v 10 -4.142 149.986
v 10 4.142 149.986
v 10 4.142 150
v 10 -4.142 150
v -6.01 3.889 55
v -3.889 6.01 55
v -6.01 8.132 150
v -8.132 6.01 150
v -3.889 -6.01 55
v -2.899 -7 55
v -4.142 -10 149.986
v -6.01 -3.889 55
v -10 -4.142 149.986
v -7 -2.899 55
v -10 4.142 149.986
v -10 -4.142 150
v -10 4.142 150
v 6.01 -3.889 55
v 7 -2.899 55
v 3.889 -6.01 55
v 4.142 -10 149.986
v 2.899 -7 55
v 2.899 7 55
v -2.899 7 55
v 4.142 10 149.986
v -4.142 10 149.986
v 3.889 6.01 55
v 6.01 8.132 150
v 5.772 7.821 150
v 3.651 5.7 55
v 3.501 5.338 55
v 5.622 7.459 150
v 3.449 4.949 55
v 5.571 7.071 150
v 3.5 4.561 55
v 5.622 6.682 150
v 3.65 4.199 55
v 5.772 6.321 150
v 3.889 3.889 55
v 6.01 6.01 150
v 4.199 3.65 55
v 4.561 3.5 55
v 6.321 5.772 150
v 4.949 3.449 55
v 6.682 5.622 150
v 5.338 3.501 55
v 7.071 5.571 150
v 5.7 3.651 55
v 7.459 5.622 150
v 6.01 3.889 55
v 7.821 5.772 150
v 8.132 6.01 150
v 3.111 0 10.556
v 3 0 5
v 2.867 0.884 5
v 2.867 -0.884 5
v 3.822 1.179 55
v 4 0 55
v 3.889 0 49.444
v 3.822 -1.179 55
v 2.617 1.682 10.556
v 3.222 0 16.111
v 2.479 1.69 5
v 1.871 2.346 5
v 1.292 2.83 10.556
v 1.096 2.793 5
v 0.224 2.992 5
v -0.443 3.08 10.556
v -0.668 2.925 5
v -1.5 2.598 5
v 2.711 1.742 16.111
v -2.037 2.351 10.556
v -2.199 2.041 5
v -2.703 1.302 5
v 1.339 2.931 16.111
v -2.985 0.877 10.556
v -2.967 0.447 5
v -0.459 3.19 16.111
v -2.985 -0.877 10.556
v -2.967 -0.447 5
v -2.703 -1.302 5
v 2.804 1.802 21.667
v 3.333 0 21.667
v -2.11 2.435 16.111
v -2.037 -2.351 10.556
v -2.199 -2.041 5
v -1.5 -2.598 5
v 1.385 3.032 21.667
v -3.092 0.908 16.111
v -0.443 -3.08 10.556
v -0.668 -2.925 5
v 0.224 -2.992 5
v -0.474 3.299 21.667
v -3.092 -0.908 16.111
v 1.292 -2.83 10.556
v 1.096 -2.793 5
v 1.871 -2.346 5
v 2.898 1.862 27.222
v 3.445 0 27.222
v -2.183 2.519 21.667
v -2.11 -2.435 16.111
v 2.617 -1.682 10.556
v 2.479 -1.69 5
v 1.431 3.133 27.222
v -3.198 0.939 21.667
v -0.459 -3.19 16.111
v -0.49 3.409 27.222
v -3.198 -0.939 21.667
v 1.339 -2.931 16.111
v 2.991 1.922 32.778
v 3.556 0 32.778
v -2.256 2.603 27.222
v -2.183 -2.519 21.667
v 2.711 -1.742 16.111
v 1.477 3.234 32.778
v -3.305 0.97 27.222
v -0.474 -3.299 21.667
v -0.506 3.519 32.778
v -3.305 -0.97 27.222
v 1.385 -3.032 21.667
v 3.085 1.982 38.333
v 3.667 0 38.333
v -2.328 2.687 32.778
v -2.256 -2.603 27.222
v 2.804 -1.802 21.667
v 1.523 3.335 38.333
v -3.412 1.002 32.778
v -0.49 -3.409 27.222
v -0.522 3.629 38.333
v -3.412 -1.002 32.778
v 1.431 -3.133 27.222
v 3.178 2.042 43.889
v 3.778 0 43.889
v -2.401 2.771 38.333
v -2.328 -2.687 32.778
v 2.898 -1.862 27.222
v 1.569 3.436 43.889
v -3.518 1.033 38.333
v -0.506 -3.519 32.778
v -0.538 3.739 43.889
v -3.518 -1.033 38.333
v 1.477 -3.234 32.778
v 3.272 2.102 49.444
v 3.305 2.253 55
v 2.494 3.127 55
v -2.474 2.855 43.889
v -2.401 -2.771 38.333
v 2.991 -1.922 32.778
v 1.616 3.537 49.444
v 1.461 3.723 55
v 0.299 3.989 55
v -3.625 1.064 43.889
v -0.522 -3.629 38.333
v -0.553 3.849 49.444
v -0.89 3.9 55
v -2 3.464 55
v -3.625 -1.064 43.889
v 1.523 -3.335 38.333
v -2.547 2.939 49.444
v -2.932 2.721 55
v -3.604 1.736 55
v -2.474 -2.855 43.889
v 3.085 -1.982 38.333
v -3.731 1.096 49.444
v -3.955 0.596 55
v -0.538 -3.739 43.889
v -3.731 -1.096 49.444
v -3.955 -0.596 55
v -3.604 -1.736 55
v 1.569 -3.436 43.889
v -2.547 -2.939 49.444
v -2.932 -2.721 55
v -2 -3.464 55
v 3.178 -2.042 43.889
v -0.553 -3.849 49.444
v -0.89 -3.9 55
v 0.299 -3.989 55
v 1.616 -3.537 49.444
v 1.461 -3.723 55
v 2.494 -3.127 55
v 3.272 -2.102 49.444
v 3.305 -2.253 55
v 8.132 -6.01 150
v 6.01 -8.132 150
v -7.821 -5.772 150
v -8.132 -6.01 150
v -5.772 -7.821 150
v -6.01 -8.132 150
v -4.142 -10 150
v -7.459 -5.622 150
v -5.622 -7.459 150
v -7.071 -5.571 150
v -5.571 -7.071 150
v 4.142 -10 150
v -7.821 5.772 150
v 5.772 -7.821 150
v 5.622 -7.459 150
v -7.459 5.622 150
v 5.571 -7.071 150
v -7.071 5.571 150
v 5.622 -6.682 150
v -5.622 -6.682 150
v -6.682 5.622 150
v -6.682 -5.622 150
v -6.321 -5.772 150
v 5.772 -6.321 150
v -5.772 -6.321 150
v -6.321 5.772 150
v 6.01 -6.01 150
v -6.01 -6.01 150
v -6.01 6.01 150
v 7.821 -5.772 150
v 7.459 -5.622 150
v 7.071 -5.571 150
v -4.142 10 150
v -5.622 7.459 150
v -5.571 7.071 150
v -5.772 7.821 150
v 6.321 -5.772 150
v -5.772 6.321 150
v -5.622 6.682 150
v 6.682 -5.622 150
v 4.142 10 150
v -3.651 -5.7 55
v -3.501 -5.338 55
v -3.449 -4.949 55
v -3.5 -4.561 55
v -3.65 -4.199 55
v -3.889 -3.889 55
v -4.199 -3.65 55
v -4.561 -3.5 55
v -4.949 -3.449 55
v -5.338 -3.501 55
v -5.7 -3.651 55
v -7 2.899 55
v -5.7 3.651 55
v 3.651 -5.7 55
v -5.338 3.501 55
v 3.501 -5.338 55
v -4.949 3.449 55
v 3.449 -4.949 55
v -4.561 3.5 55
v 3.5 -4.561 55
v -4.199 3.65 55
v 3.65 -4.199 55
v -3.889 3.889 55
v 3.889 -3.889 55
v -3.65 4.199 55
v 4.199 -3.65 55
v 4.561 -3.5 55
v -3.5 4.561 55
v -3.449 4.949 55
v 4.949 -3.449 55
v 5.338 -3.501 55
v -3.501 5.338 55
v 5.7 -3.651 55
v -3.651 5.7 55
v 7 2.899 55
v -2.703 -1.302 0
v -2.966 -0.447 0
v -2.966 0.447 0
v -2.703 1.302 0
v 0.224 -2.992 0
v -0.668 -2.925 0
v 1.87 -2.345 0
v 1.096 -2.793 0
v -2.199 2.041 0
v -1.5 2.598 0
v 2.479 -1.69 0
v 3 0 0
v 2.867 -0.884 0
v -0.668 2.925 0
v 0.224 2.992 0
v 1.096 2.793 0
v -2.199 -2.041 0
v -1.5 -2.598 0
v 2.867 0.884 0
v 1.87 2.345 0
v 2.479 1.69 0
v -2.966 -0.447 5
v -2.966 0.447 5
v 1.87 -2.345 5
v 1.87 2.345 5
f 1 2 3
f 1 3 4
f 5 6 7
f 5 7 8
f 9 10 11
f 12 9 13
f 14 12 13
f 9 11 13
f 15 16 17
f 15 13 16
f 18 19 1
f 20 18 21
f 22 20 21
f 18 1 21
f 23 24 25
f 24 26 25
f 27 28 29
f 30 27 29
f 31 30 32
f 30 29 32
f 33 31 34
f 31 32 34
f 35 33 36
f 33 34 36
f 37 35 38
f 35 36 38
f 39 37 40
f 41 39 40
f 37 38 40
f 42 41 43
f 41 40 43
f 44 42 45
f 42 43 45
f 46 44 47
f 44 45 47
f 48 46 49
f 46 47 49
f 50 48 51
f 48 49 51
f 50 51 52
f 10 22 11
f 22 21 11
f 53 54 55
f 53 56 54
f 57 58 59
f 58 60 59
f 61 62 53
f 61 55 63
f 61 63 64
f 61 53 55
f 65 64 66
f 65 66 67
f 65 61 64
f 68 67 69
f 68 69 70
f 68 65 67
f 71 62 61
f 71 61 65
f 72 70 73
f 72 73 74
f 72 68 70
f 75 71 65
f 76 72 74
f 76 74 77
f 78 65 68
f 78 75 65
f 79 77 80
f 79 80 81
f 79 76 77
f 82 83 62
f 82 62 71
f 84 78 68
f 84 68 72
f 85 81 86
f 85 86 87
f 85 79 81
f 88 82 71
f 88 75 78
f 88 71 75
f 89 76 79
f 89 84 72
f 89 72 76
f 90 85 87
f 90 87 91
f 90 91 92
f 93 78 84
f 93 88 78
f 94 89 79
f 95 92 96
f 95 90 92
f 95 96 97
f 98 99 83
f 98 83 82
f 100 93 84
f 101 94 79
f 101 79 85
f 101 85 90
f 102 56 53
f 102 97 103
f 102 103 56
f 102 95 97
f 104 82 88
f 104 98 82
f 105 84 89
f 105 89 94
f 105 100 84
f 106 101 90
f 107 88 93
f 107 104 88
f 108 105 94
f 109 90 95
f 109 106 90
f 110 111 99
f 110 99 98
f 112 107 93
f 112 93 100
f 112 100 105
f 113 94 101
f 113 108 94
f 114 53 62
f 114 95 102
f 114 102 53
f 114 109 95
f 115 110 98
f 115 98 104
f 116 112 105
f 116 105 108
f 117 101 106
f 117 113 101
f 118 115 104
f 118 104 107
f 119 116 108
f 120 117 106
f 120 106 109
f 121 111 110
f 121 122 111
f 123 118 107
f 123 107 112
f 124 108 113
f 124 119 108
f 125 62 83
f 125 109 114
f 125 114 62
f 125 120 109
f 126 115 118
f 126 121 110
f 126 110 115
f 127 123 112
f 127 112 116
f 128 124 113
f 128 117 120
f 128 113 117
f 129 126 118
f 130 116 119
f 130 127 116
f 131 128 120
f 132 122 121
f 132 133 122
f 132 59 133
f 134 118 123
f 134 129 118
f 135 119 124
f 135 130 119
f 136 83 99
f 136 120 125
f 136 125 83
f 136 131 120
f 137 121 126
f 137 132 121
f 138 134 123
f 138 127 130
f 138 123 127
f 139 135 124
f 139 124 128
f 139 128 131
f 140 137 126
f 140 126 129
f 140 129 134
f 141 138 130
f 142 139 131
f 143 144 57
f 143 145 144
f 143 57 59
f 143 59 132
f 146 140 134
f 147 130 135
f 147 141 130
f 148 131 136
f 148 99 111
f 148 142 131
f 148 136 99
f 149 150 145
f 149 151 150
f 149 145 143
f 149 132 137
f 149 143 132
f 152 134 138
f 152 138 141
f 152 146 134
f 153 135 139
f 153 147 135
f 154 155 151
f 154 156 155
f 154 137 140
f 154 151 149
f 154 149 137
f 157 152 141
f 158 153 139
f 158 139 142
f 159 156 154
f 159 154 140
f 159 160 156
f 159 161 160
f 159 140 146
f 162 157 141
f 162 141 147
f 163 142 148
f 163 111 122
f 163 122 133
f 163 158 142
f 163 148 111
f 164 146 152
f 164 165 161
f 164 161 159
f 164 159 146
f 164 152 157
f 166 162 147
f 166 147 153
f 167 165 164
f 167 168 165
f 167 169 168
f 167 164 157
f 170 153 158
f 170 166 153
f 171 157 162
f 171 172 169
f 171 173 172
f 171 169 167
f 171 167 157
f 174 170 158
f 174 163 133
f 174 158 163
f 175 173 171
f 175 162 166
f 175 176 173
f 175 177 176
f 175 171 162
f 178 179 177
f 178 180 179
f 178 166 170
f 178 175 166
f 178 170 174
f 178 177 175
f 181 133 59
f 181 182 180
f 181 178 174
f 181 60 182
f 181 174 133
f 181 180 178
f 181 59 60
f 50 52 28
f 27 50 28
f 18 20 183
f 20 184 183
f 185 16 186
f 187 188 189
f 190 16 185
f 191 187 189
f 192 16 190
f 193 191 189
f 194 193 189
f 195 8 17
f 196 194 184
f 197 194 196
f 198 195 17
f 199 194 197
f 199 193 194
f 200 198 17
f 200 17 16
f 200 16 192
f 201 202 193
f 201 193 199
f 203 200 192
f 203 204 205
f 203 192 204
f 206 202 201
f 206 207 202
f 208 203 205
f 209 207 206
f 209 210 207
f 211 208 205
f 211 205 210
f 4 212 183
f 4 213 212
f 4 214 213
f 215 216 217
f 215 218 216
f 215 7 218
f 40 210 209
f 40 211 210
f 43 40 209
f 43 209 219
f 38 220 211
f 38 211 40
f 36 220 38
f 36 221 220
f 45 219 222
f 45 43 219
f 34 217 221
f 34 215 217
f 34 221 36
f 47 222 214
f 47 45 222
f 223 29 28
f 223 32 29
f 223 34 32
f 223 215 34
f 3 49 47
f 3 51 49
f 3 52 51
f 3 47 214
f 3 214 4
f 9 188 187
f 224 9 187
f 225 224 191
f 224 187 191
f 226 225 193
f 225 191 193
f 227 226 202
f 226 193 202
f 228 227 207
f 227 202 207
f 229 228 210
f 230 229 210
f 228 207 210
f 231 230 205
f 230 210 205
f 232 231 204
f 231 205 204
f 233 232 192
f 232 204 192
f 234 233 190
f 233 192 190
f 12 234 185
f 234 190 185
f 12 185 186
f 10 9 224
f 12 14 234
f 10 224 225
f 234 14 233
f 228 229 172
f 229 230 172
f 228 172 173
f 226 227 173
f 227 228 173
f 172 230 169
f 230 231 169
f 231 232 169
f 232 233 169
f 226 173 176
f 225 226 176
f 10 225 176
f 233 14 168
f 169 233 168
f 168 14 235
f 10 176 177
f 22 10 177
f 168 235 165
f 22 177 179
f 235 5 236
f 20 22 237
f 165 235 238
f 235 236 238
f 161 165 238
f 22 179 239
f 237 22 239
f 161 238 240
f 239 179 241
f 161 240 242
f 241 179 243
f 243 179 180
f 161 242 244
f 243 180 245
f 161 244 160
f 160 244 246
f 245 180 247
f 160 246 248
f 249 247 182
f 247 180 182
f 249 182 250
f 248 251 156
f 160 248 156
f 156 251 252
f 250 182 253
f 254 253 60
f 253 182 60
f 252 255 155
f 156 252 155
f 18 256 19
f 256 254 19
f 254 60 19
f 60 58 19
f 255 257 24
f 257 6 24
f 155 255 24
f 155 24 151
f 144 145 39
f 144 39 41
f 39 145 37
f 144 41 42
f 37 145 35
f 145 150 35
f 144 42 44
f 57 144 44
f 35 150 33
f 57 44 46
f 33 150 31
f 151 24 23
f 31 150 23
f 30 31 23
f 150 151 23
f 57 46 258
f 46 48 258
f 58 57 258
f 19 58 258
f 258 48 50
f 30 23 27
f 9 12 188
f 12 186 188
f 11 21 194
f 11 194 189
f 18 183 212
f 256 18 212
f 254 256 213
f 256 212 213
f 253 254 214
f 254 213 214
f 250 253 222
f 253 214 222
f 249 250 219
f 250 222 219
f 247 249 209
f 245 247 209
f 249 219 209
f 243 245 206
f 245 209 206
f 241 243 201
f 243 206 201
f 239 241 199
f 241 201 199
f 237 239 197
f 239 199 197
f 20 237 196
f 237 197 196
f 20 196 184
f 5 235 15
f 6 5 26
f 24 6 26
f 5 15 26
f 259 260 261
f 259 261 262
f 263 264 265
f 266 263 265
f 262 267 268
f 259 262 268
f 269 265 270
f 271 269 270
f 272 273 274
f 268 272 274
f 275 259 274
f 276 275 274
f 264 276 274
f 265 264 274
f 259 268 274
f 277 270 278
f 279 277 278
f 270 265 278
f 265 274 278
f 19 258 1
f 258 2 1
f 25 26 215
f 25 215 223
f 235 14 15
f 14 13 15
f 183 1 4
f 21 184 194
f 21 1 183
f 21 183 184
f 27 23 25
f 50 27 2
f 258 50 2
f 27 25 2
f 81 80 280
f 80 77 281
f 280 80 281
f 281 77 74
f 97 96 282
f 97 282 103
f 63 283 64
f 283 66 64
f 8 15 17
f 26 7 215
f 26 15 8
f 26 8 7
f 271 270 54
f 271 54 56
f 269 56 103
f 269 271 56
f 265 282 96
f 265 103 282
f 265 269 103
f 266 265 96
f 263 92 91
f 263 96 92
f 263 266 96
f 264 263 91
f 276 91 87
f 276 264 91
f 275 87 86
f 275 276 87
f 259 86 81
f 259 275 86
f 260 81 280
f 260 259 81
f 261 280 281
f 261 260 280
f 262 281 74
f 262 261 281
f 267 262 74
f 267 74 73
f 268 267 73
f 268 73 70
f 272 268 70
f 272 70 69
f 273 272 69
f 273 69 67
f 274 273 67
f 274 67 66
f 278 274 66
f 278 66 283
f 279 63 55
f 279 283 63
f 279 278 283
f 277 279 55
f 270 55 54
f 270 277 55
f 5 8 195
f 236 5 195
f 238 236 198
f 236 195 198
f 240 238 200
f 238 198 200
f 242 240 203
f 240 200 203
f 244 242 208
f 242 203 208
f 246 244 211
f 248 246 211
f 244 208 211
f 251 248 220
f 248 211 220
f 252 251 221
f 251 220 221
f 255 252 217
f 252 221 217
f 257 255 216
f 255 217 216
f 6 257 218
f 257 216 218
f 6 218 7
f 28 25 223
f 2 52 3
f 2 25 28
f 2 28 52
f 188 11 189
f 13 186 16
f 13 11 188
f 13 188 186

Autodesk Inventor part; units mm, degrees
sketch "Эскиз1" plane through (0, 0, 0) normal (0, 0, 1) x (1, 0, 0)
  circle A0 centre (0, 0) radius 3
  dimension "d0" = 6
extrude "Выдавливание1" add sketch "Эскиз1" along normal blind 5
sketch "Эскиз2" plane through (0, 0, 5) normal (0, 0, 1) x (1, 0, 0)
  circle A0 centre (0, 0) radius 4
  dimension "d3" = 8
extrude "Выдавливание2" add sketch "Эскиз2" along normal blind 50
sketch "Эскиз3" plane through (0, 0, 55) normal (0, 0, 1) x (1, 0, 0)
  line L0 (-10, 4.1421) -> (-4.1421, 10)
  line L1 (-4.1421, 10) -> (4.1421, 10)
  line L2 (4.1421, 10) -> (10, 4.1421)
  line L3 (10, 4.1421) -> (10, -4.1421)
  line L4 (10, -4.1421) -> (4.1421, -10)
  line L5 (4.1421, -10) -> (-4.1421, -10)
  line L6 (-4.1421, -10) -> (-10, -4.1421)
  line L7 (-10, -4.1421) -> (-10, 4.1421)
  point P0 (0, 0)
  point P1 (0, 0)
  dimension "d6" = 20
extrude "Выдавливание3" add sketch "Эскиз3" along normal blind 95
chamfer "Фаска1" distance 1 distance2 50 1 edges at (-4, 0, 5) measured on face at (3.6279, -0.3191, 5)
chamfer "Фаска2" distance 3 angle 88.191 8 edges at (7.0711, 7.0711, 55) (0, 10, 55) (-7.0711, 7.0711, 55) (-10, 0, 55) (-7.0711, -7.0711, 55) (0, -10, 55) (7.0711, -7.0711, 55) (10, 0, 55) measured on face at (-0.1607, 7.9903, 55)
ref_plane "РабПлоскость1" through (-7.0711, 7.0711, 150) normal (-0.0223186, 0.0223186, 0.9995018) x (-0.7071068, -0.7071068, 0)
sketch "Эскиз4" plane through (-7.0711, 7.0711, 150) normal (-0.0223186, 0.0223186, 0.9995018) x (-0.7071068, -0.7071068, 0)
  line L0 (-4.1421, 0) -> (4.1421, 0) projected
  arc A0 (1.5, 0) -> (-1.5, 0) centre (0, 0) ccw
  point P0 (0, 5.2605)
  dimension "d15" = 1.5
extrude "Выдавливание4" cut sketch "Эскиз4" against normal up to next
ref_plane "РабПлоскость2" through (7.0711, 7.0711, 150) normal (0.0223186, 0.0223186, 0.9995018) x (-0.7071068, 0.7071068, 0)
sketch "Эскиз5" plane through (7.0711, 7.0711, 150) normal (0.0223186, 0.0223186, 0.9995018) x (-0.7071068, 0.7071068, 0)
  line L0 (-4.1421, 0) -> (4.1421, 0) projected
  line L1 (-2.8995, 0) -> (2.8995, 0) projected
  arc A0 (1.5, 0) -> (-1.5, 0) centre (0, 0) ccw
  line L2 (1.5, 0) -> (-1.5, 0)
  point P0 (0, 5.2605)
  dimension "d18" = 1.5
extrude "Выдавливание5" cut sketch "Эскиз5" against normal up to next
ref_plane "РабПлоскость3" through (7.0711, -7.0711, 150) normal (0.0223186, -0.0223186, 0.9995018) x (0.7071068, 0.7071068, 0)
ref_plane "РабПлоскость4" through (-7.0711, -7.0711, 150) normal (-0.0223186, -0.0223186, 0.9995018) x (0.7071068, -0.7071068, 0)
sketch "Эскиз6" plane through (7.0711, -7.0711, 150) normal (0.0223186, -0.0223186, 0.9995018) x (0.7071068, 0.7071068, 0)
  line L0 (-4.1421, 0) -> (4.1421, 0) projected
  arc A0 (1.5, 0) -> (-1.5, 0) centre (0, 0) ccw
  line L1 (1.5, 0) -> (-1.5, 0)
  point P0 (0, 5.2605)
  dimension "d21" = 1.5
extrude "Выдавливание6" cut sketch "Эскиз6" against normal up to next
sketch "Эскиз7" plane through (-7.0711, -7.0711, 150) normal (-0.0223186, -0.0223186, 0.9995018) x (0.7071068, -0.7071068, 0)
  line L0 (-4.1421, 0) -> (4.1421, 0) projected
  arc A0 (1.5, 0) -> (-1.5, 0) centre (0, 0) ccw
  line L1 (-1.5, 0) -> (1.5, 0)
  point P0 (0, 5.2605)
  dimension "d24" = 1.5
extrude "Выдавливание7" cut sketch "Эскиз7" against normal up to next
properties part number "itomaki" material "Клен"
